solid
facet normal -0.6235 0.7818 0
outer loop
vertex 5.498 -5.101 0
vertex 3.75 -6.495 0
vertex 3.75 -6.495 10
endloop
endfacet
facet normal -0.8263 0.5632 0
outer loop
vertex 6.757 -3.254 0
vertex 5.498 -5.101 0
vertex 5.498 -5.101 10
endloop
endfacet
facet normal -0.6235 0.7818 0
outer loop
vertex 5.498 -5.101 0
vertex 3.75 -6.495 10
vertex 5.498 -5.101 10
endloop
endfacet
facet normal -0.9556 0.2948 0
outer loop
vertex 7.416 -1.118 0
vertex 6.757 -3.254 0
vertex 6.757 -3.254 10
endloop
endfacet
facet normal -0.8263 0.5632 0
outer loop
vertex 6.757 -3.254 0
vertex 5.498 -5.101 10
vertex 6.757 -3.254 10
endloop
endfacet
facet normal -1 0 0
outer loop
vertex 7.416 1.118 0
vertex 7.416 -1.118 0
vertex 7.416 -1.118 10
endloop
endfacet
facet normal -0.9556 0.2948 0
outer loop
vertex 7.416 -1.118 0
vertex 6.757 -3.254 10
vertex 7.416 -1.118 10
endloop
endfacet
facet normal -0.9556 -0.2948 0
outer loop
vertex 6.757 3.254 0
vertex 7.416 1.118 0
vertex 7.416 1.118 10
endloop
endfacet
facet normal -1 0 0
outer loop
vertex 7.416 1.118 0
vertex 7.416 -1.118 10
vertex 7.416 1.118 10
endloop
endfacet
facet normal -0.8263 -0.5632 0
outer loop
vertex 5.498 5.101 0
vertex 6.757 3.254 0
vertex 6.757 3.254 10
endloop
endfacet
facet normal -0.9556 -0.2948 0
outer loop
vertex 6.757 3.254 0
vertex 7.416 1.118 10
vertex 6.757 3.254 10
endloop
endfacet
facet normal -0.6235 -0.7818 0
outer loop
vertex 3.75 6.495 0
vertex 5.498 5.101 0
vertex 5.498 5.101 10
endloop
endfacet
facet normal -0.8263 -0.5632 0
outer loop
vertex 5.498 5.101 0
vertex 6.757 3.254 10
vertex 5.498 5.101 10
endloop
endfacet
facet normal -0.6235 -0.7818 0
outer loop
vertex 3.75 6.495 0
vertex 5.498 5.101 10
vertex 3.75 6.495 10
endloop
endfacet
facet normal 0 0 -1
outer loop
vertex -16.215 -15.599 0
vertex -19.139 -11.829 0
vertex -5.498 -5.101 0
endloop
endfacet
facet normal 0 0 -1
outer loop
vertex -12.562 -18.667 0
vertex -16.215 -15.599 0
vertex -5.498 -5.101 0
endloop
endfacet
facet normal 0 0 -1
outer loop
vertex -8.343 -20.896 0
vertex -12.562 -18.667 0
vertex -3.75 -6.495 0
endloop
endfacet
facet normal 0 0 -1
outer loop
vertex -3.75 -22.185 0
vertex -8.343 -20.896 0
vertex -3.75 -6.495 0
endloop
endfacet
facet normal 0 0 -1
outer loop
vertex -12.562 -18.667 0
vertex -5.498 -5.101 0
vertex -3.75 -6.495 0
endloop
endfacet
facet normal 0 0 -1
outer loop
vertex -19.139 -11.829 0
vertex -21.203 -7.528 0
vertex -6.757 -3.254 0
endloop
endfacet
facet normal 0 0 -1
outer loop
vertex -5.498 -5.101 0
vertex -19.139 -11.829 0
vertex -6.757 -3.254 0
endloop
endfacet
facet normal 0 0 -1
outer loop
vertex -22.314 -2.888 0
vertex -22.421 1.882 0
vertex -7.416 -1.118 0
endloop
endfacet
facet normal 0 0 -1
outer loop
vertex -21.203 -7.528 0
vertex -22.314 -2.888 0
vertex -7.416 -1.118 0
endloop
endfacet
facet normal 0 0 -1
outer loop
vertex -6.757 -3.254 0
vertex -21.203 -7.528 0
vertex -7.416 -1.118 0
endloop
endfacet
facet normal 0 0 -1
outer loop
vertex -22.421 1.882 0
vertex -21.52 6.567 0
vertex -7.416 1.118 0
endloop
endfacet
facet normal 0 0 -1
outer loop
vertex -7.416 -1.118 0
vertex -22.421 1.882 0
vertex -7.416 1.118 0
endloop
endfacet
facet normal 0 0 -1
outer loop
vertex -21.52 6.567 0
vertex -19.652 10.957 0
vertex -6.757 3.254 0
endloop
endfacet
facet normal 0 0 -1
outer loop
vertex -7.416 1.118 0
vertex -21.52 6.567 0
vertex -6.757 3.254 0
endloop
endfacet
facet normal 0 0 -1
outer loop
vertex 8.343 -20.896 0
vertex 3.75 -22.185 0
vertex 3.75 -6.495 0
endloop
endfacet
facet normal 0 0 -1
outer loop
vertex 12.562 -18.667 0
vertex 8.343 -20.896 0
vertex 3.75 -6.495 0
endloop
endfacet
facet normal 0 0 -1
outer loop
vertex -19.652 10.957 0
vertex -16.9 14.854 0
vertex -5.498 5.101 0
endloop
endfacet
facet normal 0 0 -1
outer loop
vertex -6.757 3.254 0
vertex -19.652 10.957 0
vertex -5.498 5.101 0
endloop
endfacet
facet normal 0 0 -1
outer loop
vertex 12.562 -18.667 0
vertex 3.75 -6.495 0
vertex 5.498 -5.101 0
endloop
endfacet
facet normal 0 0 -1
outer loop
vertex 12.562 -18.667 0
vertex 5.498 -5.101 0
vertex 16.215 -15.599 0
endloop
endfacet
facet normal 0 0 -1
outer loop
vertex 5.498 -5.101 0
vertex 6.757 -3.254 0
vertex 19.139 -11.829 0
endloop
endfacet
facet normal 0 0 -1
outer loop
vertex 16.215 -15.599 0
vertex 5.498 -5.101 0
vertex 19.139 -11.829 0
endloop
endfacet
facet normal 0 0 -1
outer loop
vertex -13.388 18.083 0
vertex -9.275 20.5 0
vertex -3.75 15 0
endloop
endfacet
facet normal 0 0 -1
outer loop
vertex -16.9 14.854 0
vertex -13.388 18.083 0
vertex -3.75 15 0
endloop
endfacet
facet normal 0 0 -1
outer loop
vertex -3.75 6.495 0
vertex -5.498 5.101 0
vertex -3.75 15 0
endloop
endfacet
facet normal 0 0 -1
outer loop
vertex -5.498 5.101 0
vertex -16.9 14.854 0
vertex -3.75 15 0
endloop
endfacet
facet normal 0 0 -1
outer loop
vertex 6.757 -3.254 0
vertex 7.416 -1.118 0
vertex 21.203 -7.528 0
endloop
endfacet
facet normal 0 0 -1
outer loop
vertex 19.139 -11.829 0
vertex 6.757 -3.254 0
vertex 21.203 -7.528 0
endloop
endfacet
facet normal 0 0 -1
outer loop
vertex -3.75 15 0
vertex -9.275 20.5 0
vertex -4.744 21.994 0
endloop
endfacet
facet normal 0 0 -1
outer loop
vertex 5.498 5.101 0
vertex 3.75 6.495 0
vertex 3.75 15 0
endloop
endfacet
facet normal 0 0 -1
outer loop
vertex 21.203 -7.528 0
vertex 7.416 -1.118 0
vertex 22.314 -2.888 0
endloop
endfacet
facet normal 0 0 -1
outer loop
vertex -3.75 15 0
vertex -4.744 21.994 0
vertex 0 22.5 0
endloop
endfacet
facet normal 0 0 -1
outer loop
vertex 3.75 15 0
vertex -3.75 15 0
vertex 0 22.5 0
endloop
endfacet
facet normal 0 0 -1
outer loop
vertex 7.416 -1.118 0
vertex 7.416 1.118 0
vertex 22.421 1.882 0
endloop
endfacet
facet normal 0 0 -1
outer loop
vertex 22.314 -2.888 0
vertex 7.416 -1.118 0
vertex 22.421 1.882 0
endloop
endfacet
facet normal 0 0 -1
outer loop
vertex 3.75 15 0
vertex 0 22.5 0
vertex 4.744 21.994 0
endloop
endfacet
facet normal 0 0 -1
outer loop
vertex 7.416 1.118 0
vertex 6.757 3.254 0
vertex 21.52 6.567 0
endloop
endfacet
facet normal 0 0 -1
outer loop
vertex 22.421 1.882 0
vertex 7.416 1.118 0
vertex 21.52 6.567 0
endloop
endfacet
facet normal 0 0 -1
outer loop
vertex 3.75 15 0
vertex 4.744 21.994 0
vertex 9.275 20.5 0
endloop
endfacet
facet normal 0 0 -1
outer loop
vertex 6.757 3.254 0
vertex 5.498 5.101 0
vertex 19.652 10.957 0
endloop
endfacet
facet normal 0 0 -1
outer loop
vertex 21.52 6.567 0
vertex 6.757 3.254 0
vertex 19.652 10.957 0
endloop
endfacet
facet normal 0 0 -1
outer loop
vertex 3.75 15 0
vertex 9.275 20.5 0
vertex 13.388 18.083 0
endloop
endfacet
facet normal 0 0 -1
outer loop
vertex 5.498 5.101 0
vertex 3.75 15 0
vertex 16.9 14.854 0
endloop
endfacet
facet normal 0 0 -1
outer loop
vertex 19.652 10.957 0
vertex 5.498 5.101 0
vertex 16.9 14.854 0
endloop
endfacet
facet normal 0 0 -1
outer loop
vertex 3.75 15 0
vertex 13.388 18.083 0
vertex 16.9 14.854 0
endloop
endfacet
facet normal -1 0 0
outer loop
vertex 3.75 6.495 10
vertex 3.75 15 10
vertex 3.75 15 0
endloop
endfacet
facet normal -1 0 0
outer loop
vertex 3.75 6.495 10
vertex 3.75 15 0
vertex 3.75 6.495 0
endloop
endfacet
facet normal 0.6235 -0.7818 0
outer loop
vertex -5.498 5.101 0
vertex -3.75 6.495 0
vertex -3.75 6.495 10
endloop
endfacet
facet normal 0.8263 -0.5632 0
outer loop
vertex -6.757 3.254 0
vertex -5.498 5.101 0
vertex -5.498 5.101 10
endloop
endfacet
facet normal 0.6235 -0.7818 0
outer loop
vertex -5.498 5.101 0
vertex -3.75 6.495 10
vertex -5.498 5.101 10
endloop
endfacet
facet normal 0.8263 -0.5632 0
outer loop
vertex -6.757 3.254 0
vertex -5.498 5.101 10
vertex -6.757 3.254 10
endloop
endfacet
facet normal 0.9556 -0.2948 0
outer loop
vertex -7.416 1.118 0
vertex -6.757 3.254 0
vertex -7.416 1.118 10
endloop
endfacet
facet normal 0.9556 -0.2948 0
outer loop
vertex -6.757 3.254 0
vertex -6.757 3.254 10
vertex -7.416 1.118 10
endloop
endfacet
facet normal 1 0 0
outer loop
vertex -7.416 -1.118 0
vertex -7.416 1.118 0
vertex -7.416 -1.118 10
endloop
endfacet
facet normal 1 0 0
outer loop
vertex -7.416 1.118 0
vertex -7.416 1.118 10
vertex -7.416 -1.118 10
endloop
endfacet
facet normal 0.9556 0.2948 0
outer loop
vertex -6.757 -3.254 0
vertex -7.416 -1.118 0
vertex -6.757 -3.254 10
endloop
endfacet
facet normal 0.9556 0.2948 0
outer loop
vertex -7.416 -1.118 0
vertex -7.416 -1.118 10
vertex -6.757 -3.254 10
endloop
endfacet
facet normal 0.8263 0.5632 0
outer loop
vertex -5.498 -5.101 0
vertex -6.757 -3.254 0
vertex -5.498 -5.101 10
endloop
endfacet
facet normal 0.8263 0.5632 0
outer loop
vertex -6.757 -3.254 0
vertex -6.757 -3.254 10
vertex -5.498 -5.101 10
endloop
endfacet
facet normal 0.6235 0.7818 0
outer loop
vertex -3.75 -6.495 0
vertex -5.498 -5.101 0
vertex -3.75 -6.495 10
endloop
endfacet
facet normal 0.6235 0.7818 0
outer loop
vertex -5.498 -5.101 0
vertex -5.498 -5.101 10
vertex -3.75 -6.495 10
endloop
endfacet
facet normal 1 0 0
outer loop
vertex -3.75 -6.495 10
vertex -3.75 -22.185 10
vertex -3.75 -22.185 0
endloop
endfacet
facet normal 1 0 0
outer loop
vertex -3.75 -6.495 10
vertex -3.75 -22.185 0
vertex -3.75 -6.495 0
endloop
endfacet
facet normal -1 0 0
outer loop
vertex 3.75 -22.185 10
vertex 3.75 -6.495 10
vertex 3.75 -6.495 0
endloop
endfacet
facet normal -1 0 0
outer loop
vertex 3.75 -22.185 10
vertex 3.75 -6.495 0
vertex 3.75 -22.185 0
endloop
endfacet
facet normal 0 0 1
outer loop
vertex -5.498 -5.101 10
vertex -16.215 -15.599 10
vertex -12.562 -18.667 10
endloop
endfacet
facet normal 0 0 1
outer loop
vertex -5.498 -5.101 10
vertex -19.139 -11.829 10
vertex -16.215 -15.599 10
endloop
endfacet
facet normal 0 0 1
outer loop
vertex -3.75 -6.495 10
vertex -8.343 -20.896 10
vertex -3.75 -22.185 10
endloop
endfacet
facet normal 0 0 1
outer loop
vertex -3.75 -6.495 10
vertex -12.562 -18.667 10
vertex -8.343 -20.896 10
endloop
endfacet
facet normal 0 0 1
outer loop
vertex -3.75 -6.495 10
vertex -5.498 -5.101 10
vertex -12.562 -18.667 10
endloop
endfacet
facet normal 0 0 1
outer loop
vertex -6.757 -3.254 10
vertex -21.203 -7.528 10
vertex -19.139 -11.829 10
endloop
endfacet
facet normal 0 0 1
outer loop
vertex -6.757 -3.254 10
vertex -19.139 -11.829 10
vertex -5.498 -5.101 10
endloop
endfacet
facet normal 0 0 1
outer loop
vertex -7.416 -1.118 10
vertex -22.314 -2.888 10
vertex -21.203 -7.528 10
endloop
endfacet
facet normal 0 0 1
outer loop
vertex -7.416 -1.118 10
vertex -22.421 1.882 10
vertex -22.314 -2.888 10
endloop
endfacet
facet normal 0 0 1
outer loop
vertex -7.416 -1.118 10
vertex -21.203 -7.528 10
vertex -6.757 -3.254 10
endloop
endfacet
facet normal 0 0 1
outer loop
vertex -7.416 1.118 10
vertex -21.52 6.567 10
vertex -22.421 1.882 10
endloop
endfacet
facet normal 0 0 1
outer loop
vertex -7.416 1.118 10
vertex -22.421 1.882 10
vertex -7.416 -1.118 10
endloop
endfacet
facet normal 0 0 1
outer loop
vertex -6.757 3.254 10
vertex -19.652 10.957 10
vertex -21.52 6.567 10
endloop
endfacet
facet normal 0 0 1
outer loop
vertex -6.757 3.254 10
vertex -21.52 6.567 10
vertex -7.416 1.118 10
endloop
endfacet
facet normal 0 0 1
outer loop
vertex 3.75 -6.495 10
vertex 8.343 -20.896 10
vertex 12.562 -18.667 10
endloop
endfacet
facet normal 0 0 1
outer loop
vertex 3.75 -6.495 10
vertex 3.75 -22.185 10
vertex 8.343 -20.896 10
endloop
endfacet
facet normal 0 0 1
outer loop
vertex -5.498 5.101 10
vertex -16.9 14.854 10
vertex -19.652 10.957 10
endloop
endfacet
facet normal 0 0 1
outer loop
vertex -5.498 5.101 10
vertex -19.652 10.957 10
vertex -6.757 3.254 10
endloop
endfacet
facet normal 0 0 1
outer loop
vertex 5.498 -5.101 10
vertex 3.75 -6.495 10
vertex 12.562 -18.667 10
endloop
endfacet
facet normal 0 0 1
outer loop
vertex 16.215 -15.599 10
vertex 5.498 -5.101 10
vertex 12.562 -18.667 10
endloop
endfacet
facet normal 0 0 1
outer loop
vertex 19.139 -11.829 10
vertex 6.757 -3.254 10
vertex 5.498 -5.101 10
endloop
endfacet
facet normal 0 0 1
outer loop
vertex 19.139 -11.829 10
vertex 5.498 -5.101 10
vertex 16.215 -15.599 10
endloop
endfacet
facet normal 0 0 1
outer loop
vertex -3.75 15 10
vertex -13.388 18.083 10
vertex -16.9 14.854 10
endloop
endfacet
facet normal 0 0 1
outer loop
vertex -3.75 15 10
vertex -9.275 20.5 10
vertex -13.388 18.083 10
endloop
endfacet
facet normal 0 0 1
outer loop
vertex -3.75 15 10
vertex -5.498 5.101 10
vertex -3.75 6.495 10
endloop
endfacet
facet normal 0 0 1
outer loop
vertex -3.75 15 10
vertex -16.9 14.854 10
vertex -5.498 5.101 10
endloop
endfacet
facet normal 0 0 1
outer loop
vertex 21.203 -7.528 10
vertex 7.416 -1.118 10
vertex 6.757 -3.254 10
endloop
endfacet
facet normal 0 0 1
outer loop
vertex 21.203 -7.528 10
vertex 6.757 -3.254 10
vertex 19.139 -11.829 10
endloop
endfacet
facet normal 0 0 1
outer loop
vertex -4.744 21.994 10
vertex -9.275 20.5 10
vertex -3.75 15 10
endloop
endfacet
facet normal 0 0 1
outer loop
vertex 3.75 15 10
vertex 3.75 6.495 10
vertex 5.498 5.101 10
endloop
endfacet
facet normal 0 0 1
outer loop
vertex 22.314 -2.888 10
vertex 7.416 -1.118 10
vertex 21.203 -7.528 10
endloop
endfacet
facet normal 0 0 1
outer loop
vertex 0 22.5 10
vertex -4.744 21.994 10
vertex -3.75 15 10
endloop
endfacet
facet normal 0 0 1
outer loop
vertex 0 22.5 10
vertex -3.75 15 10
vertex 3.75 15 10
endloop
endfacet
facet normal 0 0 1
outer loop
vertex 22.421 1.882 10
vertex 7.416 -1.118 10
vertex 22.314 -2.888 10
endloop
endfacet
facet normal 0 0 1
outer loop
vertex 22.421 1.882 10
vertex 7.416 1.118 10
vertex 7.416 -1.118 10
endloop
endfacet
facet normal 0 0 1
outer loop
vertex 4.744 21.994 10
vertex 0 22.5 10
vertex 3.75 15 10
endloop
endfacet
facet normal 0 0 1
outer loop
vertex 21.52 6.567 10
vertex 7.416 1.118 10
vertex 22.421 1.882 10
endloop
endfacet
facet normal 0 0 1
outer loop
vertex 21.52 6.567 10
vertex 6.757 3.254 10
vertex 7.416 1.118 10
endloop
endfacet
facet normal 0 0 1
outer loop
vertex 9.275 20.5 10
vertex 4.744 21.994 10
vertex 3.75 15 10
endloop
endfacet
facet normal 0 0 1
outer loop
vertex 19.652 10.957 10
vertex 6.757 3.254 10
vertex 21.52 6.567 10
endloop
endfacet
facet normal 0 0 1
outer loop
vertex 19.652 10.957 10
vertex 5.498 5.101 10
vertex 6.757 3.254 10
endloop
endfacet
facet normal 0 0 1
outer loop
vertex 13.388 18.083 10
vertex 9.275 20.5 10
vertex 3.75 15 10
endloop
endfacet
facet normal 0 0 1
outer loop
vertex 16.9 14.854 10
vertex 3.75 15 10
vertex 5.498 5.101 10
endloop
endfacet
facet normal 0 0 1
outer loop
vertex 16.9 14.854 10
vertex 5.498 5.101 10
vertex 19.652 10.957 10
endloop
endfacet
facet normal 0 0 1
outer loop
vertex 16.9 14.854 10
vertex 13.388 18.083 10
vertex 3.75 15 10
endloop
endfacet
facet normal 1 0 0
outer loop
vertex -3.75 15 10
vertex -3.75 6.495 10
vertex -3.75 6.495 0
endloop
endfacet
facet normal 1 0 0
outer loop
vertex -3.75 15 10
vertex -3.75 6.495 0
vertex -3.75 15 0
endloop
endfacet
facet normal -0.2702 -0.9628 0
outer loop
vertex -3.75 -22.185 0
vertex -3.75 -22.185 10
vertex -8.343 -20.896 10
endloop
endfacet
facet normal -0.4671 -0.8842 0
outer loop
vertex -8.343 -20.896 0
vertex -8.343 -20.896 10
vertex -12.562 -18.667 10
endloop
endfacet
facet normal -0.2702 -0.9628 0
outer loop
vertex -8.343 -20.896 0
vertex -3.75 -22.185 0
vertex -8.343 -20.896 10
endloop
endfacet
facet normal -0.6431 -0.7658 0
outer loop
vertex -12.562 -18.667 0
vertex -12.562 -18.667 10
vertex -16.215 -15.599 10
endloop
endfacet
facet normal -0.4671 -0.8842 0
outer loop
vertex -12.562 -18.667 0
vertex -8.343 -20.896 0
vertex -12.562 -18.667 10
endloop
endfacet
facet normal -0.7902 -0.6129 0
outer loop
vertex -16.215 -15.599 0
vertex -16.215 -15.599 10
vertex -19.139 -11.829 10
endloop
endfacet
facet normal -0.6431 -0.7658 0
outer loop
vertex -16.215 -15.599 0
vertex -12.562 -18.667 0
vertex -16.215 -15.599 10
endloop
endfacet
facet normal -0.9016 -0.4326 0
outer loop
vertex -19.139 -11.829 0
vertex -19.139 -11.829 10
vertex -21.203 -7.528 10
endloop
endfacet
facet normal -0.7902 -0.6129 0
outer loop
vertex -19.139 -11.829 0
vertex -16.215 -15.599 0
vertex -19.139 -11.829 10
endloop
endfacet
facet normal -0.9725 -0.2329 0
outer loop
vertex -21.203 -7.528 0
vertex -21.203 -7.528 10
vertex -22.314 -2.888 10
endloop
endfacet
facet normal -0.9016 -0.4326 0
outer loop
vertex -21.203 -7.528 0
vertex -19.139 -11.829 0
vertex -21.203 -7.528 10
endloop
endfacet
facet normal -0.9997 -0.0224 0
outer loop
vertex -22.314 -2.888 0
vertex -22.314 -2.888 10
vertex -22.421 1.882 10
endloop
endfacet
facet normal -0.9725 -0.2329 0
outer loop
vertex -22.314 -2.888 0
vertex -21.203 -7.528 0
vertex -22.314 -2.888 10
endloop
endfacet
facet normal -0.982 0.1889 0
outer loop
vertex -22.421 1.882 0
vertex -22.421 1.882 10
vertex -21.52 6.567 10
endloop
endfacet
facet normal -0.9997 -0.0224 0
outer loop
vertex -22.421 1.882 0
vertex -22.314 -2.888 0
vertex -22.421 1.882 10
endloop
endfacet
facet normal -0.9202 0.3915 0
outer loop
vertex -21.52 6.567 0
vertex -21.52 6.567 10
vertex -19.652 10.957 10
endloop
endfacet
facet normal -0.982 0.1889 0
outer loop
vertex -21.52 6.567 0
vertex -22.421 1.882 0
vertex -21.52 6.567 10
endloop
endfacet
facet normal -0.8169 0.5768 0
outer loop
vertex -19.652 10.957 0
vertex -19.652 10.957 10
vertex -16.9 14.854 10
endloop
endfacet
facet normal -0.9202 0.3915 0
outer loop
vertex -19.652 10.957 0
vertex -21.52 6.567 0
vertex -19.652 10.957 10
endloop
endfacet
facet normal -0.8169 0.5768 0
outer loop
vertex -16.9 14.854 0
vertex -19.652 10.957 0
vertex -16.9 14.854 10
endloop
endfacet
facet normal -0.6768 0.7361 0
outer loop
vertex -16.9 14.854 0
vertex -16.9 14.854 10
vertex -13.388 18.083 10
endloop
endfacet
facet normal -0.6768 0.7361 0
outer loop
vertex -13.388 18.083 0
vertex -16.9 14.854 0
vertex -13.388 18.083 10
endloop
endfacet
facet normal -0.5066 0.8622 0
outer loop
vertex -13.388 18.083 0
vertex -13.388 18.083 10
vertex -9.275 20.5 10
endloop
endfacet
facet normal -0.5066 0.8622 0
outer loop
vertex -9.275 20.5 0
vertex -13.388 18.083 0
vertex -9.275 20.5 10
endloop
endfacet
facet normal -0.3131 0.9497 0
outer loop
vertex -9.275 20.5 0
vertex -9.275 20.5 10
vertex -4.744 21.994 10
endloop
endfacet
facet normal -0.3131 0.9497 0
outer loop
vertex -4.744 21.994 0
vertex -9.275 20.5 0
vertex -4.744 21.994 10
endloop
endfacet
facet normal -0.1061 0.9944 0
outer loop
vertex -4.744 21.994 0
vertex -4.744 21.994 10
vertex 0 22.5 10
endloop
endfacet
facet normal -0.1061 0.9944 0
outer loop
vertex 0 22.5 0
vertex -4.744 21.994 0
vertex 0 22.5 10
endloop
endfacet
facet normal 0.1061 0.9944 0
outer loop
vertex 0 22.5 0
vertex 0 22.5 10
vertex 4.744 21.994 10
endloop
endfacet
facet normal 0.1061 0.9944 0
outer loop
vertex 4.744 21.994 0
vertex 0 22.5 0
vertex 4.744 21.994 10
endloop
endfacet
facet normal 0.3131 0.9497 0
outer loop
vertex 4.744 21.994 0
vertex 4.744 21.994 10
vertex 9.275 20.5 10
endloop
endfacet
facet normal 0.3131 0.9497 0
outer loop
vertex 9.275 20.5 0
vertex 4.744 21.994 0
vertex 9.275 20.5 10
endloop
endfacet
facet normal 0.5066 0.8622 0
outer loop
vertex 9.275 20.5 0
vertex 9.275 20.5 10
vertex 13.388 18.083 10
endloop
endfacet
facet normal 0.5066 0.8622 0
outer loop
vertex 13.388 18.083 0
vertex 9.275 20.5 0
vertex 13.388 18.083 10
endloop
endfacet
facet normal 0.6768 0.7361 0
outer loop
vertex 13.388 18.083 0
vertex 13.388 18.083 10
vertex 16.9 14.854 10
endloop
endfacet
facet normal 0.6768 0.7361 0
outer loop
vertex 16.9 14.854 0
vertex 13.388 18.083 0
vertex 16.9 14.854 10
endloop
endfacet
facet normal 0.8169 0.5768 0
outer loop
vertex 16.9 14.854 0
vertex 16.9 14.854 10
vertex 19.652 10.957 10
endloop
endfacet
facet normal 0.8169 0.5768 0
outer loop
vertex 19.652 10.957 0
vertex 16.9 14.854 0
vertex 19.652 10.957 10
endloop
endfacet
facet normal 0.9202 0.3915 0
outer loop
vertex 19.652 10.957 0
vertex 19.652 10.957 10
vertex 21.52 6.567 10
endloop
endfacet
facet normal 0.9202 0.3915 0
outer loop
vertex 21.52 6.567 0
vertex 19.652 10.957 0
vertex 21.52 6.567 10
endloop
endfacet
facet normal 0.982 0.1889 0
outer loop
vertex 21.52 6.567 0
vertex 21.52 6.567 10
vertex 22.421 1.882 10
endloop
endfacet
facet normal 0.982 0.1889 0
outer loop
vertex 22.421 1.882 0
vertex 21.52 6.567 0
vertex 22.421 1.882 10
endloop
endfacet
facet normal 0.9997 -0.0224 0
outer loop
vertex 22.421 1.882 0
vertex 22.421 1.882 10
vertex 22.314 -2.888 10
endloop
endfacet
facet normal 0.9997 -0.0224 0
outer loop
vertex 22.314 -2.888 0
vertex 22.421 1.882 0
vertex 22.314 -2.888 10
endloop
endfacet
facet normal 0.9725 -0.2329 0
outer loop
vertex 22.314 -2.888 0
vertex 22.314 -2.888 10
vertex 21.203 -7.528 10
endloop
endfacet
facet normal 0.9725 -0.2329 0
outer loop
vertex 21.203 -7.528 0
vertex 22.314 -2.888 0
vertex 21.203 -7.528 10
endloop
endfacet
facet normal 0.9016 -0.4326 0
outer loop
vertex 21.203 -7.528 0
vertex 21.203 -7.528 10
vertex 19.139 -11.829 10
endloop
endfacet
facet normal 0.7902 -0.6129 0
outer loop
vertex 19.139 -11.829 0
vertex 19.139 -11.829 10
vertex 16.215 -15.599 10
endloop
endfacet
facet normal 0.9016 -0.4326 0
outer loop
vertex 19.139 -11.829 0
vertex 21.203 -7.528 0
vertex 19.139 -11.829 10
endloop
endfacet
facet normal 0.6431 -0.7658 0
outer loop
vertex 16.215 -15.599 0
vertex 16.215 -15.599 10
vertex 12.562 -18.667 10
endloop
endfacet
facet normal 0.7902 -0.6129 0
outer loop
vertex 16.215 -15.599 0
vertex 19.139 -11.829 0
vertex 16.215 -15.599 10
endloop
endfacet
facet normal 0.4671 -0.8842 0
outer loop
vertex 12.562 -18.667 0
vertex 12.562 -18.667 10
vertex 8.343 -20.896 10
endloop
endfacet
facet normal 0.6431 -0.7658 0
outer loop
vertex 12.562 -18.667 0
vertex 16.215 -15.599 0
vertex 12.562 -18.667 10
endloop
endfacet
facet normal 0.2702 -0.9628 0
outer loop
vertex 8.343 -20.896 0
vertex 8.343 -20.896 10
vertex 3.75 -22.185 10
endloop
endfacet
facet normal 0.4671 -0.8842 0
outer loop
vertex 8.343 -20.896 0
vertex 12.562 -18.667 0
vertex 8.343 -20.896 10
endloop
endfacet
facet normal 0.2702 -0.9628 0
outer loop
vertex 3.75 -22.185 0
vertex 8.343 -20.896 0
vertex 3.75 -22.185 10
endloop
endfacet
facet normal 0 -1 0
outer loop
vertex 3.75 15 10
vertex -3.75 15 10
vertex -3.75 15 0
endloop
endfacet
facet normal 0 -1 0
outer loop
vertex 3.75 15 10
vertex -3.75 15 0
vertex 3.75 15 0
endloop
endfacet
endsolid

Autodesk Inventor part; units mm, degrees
ref_plane "YZ Plane" through (0, 0, 0) normal (1, 0, 0) x (0, 1, 0)
ref_plane "XZ Plane" through (0, 0, 0) normal (0, 1, 0) x (-1, 0, 0)
ref_plane "XY Plane" through (0, 0, 0) normal (0, 0, 1) x (1, 0, 0)
sketch "Sketch1" plane through (0, 0, 0) normal (0, 0, 1) x (1, 0, 0)
  point P0 (0, 0)
sketch "Sketch2" plane through (0, 0, 0) normal (0, 0, 1) x (1, 0, 0)
  circle A0 centre (0, 0) radius 22.5
  dimension "d0" = 45
extrude "Extrusion1" add sketch "Sketch2" along normal blind 10
sketch "Sketch3" plane through (0, 0, 10) normal (0, 0, 1) x (1, 0, 0)
  line L0 (-3.75, 15) -> (3.75, 15)
  line L1 (3.75, 15) -> (3.75, -28)
  line L2 (3.75, -28) -> (-3.75, -28)
  line L3 (-3.75, -28) -> (-3.75, 15)
  point P0 (0, 0)
  dimension "d3" = 7.5
  dimension "d4" = 43
  dimension "d6" = 3.75
  dimension "d7" = 15
extrude "Extrusion2" cut sketch "Sketch3" against normal blind 10
sketch "Sketch4" plane through (0, 0, 10) normal (0, 0, 1) x (1, 0, 0)
  circle A0 centre (0, 0) radius 7.5
  dimension "d10" = 15
extrude "Extrusion3" cut sketch "Sketch4" against normal blind 10
properties part number "plate"
